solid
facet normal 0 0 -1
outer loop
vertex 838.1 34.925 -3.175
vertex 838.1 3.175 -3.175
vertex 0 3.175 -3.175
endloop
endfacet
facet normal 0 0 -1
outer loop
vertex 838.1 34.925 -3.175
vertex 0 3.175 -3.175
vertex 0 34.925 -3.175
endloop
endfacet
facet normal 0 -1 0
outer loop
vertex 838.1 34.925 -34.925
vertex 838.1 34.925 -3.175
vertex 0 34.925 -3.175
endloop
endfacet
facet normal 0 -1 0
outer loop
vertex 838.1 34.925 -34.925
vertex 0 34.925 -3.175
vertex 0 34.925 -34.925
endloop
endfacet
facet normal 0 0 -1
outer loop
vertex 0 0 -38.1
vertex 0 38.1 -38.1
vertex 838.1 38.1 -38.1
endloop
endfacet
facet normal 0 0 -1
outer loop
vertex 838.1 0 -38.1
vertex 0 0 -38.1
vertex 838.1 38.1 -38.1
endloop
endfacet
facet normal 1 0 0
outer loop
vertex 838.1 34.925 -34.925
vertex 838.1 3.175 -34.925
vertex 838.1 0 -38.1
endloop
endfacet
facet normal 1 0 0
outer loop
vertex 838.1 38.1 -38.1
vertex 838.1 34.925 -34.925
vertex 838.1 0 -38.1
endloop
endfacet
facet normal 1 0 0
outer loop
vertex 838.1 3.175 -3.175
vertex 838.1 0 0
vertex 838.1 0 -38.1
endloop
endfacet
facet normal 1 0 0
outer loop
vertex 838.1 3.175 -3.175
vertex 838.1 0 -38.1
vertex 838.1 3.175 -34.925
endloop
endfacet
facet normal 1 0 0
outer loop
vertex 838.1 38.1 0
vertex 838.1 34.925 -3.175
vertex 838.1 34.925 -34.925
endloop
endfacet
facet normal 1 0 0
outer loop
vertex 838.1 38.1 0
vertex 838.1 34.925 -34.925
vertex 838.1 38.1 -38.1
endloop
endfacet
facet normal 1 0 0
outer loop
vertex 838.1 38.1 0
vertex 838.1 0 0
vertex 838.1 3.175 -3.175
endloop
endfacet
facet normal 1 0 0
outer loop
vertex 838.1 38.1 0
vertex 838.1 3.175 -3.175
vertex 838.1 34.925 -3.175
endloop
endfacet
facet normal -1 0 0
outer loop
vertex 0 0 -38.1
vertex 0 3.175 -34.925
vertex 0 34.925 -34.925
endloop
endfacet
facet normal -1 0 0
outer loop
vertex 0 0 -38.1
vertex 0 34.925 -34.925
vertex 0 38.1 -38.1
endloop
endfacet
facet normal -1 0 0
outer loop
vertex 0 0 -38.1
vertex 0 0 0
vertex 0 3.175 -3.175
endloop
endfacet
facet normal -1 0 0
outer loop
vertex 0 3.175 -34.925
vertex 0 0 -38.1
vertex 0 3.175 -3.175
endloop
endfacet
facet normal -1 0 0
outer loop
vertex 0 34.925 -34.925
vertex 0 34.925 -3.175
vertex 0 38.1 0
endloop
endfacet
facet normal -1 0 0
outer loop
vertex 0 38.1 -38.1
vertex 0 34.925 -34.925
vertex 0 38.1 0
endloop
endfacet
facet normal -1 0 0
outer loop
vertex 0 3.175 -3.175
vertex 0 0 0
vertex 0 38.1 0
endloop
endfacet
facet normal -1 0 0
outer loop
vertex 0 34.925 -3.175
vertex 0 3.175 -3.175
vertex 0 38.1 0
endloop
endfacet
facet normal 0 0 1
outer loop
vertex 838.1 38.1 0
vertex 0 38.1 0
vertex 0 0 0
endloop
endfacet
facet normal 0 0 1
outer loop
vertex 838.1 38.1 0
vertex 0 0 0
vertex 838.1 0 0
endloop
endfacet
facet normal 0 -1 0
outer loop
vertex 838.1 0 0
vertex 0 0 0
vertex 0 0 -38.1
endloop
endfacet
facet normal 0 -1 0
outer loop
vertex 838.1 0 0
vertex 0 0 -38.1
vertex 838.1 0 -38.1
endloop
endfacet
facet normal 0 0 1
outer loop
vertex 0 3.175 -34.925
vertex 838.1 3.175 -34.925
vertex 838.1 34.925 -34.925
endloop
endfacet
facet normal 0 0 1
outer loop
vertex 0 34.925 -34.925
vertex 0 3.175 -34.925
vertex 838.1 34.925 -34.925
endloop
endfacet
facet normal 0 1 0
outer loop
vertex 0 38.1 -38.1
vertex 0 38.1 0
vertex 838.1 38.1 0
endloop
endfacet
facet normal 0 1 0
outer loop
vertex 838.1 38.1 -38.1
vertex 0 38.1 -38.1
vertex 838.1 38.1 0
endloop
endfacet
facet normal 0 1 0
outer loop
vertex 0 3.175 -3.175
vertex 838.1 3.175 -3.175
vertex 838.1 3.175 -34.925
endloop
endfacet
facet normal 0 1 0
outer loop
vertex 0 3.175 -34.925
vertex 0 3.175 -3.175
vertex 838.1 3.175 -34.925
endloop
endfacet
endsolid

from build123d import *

# Parameters (mm, degrees)
SKETCH1_W               = 838.1
SKETCH1_H               = 38.1
BOSS_EXTRUDE1_DEPTH     = 38.1
SKETCH2_W               = 31.75
SKETCH2_H               = 31.75
CUT_EXTRUDE1_DEPTH      = 1
CUT_EXTRUDE1_DEPTH_BACK = 839.1


with BuildPart() as part:
    # Sketch1 → Boss-Extrude1 (new body)
    with BuildSketch(Plane.XY):
        with Locations((419.05, 19.05)):
            Rectangle(SKETCH1_W, SKETCH1_H)
    extrude(amount=-BOSS_EXTRUDE1_DEPTH)

    # Sketch2 → Cut-Extrude1 (cut, two sides)
    with BuildSketch(Plane(origin=(838.1, 0, 0), x_dir=(0, 0, -1), z_dir=(1, 0, 0))) as cut_extrude1_sk:
        with Locations((19.05, 19.05)):
            Rectangle(SKETCH2_W, SKETCH2_H)
    extrude(amount=CUT_EXTRUDE1_DEPTH, mode=Mode.SUBTRACT)
    extrude(cut_extrude1_sk.sketch, amount=-CUT_EXTRUDE1_DEPTH_BACK, mode=Mode.SUBTRACT)


solid = part.part
